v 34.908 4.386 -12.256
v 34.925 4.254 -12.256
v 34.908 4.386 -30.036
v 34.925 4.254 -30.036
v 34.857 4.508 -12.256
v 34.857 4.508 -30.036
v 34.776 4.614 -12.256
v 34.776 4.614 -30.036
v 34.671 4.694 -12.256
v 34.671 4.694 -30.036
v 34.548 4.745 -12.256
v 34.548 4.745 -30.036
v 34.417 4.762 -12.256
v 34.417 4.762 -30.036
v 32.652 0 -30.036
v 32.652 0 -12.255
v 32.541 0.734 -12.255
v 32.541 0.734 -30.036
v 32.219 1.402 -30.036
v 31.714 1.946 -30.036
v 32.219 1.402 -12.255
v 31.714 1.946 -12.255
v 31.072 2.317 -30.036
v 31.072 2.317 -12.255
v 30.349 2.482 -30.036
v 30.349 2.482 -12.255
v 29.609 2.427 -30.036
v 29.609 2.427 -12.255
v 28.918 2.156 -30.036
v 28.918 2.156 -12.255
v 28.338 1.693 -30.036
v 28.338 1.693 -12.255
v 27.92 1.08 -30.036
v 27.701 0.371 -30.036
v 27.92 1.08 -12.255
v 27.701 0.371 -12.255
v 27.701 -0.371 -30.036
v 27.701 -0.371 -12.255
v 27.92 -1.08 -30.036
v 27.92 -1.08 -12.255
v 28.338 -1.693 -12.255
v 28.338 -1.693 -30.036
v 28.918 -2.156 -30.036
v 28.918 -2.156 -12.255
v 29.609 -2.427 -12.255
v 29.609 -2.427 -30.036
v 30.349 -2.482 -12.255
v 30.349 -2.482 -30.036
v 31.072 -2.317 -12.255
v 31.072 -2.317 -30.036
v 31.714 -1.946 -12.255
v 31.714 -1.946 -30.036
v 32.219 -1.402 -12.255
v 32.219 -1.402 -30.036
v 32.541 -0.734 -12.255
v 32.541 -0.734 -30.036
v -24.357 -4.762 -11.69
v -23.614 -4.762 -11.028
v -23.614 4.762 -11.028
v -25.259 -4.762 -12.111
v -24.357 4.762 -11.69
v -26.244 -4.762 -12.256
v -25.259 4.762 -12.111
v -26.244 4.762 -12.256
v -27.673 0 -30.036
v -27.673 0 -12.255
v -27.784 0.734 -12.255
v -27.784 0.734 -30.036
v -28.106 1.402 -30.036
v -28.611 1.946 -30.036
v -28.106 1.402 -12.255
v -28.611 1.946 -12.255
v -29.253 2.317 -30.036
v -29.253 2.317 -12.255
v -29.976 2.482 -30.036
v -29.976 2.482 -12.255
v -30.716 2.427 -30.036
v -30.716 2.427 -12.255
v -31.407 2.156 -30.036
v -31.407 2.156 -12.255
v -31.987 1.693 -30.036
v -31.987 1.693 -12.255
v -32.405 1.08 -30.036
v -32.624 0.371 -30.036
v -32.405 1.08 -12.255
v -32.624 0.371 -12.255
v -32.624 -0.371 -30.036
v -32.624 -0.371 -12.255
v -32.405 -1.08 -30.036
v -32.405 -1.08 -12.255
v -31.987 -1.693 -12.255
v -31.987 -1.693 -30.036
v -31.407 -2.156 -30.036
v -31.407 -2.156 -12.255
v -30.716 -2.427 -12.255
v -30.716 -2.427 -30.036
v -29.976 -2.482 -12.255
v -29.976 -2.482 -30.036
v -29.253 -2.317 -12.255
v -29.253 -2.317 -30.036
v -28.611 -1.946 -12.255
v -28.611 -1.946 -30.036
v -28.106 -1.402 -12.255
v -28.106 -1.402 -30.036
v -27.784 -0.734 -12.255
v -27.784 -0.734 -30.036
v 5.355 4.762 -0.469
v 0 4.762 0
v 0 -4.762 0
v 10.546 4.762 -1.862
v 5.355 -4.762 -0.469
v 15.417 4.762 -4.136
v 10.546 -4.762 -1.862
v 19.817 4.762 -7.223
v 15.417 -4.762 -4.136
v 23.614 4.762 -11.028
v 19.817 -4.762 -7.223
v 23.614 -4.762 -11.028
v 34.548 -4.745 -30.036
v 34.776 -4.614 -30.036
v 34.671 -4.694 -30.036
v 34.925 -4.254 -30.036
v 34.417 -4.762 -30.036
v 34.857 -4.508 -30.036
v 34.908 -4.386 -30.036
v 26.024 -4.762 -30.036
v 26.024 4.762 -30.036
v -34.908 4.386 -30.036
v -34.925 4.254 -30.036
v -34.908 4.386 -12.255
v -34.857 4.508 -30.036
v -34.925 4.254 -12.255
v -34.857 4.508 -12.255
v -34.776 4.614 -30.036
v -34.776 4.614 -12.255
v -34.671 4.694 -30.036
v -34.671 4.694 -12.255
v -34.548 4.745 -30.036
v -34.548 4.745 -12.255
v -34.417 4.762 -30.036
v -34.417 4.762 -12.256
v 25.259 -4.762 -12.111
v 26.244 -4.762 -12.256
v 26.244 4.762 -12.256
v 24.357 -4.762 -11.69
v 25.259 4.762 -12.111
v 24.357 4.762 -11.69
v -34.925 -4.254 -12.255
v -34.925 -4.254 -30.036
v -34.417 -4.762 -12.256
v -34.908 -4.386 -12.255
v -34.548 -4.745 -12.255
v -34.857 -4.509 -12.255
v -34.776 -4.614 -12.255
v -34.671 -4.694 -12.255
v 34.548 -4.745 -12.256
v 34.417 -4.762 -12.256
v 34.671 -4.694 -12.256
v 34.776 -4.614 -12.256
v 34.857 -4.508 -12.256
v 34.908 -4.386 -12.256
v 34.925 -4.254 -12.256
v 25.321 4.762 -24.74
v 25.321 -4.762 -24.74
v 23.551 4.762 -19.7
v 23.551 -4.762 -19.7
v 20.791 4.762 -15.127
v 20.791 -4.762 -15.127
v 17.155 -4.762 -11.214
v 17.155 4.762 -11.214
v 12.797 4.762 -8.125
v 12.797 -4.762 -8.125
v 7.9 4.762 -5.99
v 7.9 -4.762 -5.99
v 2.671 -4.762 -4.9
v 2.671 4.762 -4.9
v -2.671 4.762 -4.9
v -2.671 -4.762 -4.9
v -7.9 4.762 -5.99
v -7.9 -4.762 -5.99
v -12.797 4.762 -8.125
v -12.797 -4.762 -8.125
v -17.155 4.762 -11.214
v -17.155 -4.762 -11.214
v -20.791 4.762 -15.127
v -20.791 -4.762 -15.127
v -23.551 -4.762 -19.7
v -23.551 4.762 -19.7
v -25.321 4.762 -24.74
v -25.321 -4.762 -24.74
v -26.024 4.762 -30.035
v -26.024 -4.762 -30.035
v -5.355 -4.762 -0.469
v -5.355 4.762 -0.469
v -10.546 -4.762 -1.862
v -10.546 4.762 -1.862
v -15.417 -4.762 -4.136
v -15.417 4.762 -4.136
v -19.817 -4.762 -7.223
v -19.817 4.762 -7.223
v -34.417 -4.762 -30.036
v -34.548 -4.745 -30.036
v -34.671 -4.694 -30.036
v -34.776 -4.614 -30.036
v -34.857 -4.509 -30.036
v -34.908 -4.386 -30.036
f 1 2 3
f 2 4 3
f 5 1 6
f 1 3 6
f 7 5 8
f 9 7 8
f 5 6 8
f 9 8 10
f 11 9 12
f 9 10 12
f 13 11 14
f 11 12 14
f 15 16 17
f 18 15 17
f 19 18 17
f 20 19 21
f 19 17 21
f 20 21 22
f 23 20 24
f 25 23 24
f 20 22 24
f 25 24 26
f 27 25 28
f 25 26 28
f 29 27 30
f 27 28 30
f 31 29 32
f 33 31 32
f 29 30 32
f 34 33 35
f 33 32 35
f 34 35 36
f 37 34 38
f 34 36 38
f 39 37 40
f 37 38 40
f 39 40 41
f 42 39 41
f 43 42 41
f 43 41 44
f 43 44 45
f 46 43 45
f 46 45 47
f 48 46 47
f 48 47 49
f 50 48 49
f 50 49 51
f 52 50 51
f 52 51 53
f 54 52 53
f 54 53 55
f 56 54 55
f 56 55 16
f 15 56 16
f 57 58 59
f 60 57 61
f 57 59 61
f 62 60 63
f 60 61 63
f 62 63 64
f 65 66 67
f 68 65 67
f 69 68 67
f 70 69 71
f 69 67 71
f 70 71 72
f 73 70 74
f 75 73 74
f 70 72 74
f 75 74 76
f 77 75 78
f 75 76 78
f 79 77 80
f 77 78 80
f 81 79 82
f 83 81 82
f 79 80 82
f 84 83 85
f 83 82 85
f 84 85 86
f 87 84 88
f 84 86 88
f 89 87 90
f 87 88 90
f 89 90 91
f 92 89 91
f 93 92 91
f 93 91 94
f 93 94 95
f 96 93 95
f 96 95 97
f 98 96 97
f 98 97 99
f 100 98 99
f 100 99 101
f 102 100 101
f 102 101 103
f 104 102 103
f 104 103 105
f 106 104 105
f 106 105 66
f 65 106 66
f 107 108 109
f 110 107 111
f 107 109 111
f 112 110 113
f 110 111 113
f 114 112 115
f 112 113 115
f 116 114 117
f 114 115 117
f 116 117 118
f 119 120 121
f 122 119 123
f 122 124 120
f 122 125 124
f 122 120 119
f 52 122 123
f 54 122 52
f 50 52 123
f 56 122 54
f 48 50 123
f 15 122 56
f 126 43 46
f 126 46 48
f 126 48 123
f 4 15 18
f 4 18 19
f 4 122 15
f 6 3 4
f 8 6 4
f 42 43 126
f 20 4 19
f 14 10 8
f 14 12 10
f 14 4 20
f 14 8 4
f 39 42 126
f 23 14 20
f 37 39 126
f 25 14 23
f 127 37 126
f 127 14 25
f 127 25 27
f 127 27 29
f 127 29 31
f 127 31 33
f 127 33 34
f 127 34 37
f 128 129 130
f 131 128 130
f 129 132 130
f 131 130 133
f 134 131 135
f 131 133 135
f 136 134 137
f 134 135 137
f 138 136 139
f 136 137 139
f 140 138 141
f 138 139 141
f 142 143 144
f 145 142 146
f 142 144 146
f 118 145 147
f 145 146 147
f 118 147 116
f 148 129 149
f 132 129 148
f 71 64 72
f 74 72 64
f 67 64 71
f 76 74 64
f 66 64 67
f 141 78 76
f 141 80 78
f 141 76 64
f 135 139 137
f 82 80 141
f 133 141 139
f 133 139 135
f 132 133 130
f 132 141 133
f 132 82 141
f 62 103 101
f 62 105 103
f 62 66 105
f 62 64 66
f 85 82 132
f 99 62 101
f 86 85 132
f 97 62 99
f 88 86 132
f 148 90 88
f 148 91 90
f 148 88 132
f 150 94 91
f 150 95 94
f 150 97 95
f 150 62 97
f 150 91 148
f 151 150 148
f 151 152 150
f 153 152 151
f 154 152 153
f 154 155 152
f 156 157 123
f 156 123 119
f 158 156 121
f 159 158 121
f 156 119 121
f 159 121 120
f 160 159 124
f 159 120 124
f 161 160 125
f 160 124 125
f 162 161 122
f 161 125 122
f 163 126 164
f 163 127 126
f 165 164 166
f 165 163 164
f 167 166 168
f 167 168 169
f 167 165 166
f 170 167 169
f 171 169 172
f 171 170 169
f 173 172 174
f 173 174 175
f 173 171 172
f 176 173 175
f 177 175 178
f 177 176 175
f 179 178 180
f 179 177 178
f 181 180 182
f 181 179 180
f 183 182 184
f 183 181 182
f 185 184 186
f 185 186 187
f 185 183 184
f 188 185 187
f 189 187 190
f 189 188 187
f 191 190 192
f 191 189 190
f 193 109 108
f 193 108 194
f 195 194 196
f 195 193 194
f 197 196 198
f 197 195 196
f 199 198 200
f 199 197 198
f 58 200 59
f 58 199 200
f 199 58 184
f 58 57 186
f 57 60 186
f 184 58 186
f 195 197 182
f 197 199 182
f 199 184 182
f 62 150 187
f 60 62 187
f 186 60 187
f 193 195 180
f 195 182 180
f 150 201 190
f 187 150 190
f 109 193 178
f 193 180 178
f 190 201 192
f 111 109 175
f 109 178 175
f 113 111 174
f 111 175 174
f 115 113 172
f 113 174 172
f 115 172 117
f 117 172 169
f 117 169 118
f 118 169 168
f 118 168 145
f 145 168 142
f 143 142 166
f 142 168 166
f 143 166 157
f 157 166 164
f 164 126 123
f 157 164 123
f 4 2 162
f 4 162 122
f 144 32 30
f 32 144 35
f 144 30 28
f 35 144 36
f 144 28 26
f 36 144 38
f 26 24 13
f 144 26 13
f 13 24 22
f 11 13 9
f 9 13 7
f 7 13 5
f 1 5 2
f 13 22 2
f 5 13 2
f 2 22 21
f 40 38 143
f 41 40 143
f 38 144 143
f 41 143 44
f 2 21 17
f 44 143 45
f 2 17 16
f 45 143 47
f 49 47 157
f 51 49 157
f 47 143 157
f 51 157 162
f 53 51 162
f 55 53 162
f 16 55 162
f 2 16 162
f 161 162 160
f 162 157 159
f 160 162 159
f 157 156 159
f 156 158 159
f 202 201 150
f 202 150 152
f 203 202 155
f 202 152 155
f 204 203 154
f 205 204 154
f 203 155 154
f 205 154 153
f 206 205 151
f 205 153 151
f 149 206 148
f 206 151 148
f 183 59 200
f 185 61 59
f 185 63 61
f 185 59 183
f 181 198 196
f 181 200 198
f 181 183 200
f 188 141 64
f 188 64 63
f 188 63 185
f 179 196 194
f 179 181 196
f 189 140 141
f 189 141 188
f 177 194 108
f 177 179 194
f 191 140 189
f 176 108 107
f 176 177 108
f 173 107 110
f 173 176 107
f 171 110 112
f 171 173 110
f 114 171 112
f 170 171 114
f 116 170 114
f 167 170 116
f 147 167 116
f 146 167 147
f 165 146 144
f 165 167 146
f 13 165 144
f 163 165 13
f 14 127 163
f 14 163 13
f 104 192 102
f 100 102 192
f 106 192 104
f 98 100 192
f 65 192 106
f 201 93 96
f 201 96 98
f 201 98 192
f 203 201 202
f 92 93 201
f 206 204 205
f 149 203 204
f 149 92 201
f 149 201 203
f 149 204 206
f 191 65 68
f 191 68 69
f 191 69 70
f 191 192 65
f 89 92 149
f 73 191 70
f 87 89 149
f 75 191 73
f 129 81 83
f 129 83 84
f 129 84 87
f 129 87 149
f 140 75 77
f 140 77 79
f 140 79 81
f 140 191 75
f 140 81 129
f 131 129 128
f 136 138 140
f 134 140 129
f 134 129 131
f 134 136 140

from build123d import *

# Parameters (mm, degrees)
BOSS_EXTRUDE1_DEPTH    = 4.7625
F_10_CLEARANCE_HOLE1_D = 4.9784
CUT_EXTRUDE2_DEPTH     = 48.038415261
FILLET1_R              = 3.429
FILLET2_R              = 0.508


with BuildPart() as part:
    # Sketch1 → Boss-Extrude1 (new, symmetric)
    with BuildSketch(Plane(origin=(0, 0, 0), x_dir=(1, 0, 0), z_dir=(0, 1, 0))):
        with BuildLine():
            Line((-26.023846391, 30.0355), (-34.925, 30.0355))
            Line((-34.925, 30.0355), (-34.925, 0))
            Line((-34.925, 0), (34.925, 0))
            Line((34.925, 0), (34.925, 30.0355))
            Line((34.925, 30.0355), (26.023846391, 30.0355))
            ThreePointArc((26.023846391, 30.0355), (0, 4.7625), (-26.023846391, 30.0355))
        make_face()
    extrude(amount=BOSS_EXTRUDE1_DEPTH, both=True)

    # #10 Clearance Hole1 (through all)
    with Locations(Plane(origin=(0, 0, -30.0355), x_dir=(-1, 0, 0), z_dir=(0, 0, -1))):
        with Locations((-30.1625, 0), (30.1625, 0)):
            Hole(F_10_CLEARANCE_HOLE1_D / 2)

    # Sketch6 → Cut-Extrude2 (cut, through all)
    with BuildSketch(Plane.XZ.offset(4.7625)):
        with BuildLine():
            Line((-24.590246893, -12.2555), (-34.925, -12.2555))
            Line((-34.925, -12.2555), (-34.925, 0))
            Line((-34.925, 0), (0, 0))
            ThreePointArc((0, 0), (-13.737517266, -3.23363551), (-24.590246893, -12.2555))
        make_face()
    cut_extrude2 = extrude(amount=-CUT_EXTRUDE2_DEPTH, mode=Mode.SUBTRACT)

    # Mirror1: Cut-Extrude2 across plane
    add(cut_extrude2.mirror(Plane(origin=(0, 0, 0), x_dir=(0, 0, 1), z_dir=(1, 0, 0))), mode=Mode.SUBTRACT)

    # Fillet1
    fillet1_edges = [part.edges().sort_by_distance(p)[0] for p in [
        (-24.590246893, 0, -12.2555),
        (24.590246893, 0, -12.2555),
    ]]
    fillet(fillet1_edges, radius=FILLET1_R)

    # Fillet2
    fillet2_edges = [part.edges().sort_by_distance(p)[0] for p in [
        (-34.925, 4.7625, -21.1455),
        (34.925, -4.7625, -21.1455),
        (34.925, 4.7625, -21.1455),
        (-34.925, -4.7625, -21.1455),
    ]]
    fillet(fillet2_edges, radius=FILLET2_R)


solid = part.part
